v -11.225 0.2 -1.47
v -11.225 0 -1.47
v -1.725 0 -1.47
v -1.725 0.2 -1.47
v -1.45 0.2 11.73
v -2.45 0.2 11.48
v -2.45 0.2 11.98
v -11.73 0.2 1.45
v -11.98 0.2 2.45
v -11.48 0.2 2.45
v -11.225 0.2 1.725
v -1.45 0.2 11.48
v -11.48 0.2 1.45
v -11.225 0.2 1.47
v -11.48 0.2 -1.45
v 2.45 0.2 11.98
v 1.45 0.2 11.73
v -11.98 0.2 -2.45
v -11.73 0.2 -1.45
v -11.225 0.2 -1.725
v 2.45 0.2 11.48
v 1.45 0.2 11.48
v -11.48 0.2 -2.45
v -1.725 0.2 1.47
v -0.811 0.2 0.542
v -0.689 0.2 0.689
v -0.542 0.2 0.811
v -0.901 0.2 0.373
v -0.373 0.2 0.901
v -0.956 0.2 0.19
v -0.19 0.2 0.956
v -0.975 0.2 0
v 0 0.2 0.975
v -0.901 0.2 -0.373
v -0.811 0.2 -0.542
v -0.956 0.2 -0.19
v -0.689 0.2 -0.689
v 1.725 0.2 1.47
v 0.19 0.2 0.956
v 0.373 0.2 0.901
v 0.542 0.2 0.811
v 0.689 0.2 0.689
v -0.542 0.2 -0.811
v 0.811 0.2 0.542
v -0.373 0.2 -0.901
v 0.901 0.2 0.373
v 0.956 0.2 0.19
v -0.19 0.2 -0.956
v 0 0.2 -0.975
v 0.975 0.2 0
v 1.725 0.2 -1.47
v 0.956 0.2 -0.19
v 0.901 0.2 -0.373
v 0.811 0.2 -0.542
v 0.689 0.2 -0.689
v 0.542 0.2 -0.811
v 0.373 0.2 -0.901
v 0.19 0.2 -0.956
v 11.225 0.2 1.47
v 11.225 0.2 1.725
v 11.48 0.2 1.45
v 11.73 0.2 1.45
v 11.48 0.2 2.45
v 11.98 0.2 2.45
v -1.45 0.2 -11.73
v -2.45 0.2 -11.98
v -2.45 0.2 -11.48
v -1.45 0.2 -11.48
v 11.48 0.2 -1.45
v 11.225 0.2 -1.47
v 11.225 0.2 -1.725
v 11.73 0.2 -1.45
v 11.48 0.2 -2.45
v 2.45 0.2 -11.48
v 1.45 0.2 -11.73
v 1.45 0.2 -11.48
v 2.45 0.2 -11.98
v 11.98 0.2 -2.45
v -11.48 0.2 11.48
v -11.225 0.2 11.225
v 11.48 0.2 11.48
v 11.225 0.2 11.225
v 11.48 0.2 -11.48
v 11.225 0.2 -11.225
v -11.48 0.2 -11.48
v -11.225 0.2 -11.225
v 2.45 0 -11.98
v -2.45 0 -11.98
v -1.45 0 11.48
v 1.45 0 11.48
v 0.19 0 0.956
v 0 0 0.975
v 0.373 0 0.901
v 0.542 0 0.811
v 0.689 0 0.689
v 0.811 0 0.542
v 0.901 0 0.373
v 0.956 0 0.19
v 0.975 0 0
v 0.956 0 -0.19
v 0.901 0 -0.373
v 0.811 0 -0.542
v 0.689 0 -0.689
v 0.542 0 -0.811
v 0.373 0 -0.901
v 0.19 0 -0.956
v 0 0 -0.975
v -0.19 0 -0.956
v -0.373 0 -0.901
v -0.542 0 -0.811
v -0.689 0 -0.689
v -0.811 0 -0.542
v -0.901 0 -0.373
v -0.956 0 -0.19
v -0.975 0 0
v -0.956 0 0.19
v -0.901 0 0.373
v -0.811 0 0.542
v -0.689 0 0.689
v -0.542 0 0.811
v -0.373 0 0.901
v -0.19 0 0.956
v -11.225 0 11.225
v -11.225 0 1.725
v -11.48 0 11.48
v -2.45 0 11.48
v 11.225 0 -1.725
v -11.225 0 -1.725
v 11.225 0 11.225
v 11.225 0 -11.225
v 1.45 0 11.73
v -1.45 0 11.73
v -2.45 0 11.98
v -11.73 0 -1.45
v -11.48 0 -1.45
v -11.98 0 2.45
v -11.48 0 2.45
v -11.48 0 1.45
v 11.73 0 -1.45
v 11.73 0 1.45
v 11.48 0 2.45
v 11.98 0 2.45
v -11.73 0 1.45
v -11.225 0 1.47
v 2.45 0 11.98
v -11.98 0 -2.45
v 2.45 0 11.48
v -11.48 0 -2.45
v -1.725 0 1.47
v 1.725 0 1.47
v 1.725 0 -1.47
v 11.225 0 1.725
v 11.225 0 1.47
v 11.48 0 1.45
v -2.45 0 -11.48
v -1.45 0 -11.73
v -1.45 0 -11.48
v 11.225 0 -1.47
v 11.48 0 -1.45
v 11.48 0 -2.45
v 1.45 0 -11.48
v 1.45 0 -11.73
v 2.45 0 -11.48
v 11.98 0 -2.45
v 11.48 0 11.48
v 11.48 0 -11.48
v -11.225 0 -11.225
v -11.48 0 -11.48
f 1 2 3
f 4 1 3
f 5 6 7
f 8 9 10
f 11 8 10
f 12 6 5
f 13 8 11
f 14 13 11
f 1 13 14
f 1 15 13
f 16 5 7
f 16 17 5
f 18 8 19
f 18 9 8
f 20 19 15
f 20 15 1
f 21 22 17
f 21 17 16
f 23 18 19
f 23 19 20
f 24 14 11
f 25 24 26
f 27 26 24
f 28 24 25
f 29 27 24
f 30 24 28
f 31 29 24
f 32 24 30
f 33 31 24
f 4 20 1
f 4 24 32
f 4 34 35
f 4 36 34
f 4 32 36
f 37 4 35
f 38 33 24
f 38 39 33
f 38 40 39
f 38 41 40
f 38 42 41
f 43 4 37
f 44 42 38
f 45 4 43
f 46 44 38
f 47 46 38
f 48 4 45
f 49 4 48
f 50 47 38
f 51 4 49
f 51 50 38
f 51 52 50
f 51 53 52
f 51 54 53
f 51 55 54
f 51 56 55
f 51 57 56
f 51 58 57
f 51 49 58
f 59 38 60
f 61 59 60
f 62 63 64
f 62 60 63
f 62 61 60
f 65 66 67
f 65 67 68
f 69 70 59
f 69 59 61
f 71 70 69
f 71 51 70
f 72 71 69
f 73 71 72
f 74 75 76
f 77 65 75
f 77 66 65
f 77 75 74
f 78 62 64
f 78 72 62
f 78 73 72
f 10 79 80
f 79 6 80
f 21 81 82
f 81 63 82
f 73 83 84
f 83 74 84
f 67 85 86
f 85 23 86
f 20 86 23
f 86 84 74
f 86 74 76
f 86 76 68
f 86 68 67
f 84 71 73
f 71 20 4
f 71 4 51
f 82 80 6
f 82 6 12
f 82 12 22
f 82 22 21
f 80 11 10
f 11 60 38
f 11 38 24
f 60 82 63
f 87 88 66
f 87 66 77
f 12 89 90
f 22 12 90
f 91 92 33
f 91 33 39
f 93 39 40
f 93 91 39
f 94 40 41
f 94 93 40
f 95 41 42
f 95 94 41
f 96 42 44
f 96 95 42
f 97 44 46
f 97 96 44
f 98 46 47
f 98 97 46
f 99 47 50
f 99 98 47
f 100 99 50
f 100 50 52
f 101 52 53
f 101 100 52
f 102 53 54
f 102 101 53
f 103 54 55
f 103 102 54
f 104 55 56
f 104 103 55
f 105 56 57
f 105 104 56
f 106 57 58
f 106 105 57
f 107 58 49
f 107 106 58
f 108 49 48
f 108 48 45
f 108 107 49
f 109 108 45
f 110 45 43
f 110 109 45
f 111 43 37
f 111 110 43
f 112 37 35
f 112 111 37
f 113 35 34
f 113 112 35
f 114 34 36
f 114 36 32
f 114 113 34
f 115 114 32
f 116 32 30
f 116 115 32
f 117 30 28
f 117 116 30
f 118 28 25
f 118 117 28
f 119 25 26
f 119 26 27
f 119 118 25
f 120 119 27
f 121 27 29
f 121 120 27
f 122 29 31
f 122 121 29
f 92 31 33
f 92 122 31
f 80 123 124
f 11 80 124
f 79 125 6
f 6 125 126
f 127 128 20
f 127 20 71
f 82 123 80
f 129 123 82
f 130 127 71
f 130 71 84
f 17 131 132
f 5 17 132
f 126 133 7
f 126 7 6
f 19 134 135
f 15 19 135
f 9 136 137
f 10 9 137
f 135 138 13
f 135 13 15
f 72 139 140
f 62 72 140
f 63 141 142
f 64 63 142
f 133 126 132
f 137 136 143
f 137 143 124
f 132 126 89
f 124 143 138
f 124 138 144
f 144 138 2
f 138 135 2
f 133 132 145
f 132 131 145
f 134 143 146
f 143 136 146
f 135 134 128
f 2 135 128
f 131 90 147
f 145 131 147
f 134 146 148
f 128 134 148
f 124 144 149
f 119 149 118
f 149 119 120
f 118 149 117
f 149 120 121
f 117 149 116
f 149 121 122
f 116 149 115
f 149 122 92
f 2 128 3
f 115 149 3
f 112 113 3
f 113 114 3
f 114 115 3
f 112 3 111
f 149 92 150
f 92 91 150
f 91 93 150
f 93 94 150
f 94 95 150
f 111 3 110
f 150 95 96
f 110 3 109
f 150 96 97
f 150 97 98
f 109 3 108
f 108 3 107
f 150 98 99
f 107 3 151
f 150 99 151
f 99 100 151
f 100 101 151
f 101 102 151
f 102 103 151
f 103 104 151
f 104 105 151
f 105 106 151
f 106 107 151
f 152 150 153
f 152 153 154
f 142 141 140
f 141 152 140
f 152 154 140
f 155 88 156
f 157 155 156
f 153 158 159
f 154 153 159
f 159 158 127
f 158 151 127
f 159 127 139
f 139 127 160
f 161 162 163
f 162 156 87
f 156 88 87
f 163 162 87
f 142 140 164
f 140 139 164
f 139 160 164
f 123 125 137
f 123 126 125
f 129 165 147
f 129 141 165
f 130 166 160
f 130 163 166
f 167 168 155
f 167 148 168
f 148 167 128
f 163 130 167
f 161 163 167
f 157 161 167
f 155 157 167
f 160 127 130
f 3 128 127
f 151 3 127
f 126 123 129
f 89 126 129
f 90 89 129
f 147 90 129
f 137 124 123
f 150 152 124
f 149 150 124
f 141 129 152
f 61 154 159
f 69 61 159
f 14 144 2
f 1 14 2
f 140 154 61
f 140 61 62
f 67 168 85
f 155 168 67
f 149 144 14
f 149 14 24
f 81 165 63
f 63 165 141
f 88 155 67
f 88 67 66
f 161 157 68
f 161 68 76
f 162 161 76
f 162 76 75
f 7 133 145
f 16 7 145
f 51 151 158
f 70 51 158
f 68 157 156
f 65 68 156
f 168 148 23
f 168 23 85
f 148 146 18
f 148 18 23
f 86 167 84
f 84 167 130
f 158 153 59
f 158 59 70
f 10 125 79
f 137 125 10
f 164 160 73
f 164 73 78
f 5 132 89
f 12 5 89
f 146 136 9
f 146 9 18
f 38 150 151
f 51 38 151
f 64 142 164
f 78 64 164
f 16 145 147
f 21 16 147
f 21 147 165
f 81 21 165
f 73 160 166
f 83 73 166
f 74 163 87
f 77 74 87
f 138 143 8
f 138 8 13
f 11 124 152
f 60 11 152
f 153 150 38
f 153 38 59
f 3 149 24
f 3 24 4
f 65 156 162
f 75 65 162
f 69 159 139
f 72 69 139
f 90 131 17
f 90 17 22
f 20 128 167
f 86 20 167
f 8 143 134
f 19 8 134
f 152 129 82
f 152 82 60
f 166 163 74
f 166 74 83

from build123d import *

# Parameters (mm, degrees)
SKETCH1_W           = 0.25
SKETCH1_H           = 1
SKETCH1_W_2         = 22.96
SKETCH1_H_2         = 22.96
SKETCH1_W_3         = 22.45
SKETCH1_H_3         = 22.45
SKETCH1_W_4         = 9.5
SKETCH1_H_4         = 0.255
SKETCH1_W_5         = 3.45
SKETCH1_H_5         = 3.45
SKETCH1_R           = 0.975
SKETCH1_W_6         = 1
SKETCH1_H_6         = 0.25
SKETCH1_W_7         = 4.9
SKETCH1_H_7         = 4.9
BOSS_EXTRUDE5_DEPTH = 0.2


with BuildPart() as part:
    # Sketch1 → Boss-Extrude5 (new body)
    # profile 1 of 18: a face of its own
    with BuildSketch(Plane(origin=(0, 0, 0), x_dir=(1, 0, 0), z_dir=(0, 1, 0))):
        with Locations((-11.605, -1.95)):
            Rectangle(SKETCH1_W, SKETCH1_H)
    # profile 2 of 18: a face of its own
    with BuildSketch(Plane(origin=(0, 0, 0), x_dir=(1, 0, 0), z_dir=(0, 1, 0))):
        with Locations((-11.605, 1.95)):
            Rectangle(SKETCH1_W, SKETCH1_H)
    # profile 3 of 18: a face of its own
    with BuildSketch(Plane(origin=(0, 0, 0), x_dir=(1, 0, 0), z_dir=(0, 1, 0))):
        Rectangle(SKETCH1_W_2, SKETCH1_H_2)
        Rectangle(SKETCH1_W_3, SKETCH1_H_3, mode=Mode.SUBTRACT)
    # profile 4 of 18: a face of its own
    with BuildSketch(Plane(origin=(0, 0, 0), x_dir=(1, 0, 0), z_dir=(0, 1, 0))):
        with Locations((-6.475, 1.5975)):
            Rectangle(SKETCH1_W_4, SKETCH1_H_4)
    # profile 5 of 18: a face of its own
    with BuildSketch(Plane(origin=(0, 0, 0), x_dir=(1, 0, 0), z_dir=(0, 1, 0))):
        with Locations((-6.475, -1.5975)):
            Rectangle(SKETCH1_W_4, SKETCH1_H_4)
    # profile 6 of 18: a face of its own
    with BuildSketch(Plane(origin=(0, 0, 0), x_dir=(1, 0, 0), z_dir=(0, 1, 0))):
        with Locations((6.475, 1.5975)):
            Rectangle(SKETCH1_W_4, SKETCH1_H_4)
    # profile 7 of 18: a face of its own
    with BuildSketch(Plane(origin=(0, 0, 0), x_dir=(1, 0, 0), z_dir=(0, 1, 0))):
        with Locations((6.475, -1.5975)):
            Rectangle(SKETCH1_W_4, SKETCH1_H_4)
    # profile 8 of 18: a face of its own
    with BuildSketch(Plane(origin=(0, 0, 0), x_dir=(1, 0, 0), z_dir=(0, 1, 0))):
        with Locations((11.605, 1.95)):
            Rectangle(SKETCH1_W, SKETCH1_H)
    # profile 9 of 18: a face of its own
    with BuildSketch(Plane(origin=(0, 0, 0), x_dir=(1, 0, 0), z_dir=(0, 1, 0))):
        with Locations((11.605, -1.95)):
            Rectangle(SKETCH1_W, SKETCH1_H)
    # profile 10 of 18: a face of its own
    with BuildSketch(Plane(origin=(0, 0, 0), x_dir=(1, 0, 0), z_dir=(0, 1, 0))):
        Rectangle(SKETCH1_W_5, SKETCH1_H_5)
        with Locations(Location((0, 0, 0), (0, 0, 270))):
            Circle(SKETCH1_R, mode=Mode.SUBTRACT)
    # profile 11 of 18: a face of its own
    with BuildSketch(Plane(origin=(0, 0, 0), x_dir=(1, 0, 0), z_dir=(0, 1, 0))):
        Polygon((-1.45, -11.73), (-2.45, -11.73), (-2.45, -11.98), (2.45, -11.98), (2.45, -11.73), (1.45, -11.73), align=None)
    # profile 12 of 18: a face of its own
    with BuildSketch(Plane(origin=(0, 0, 0), x_dir=(1, 0, 0), z_dir=(0, 1, 0))):
        with Locations((1.95, -11.605)):
            Rectangle(SKETCH1_W_6, SKETCH1_H_6)
    # profile 13 of 18: a face of its own
    with BuildSketch(Plane(origin=(0, 0, 0), x_dir=(1, 0, 0), z_dir=(0, 1, 0))):
        with Locations((-1.95, -11.605)):
            Rectangle(SKETCH1_W_6, SKETCH1_H_6)
    # profile 14 of 18: a face of its own
    with BuildSketch(Plane(origin=(0, 0, 0), x_dir=(1, 0, 0), z_dir=(0, 1, 0))):
        Polygon((11.98, 2.45), (11.73, 2.45), (11.73, 1.45), (11.73, -1.45), (11.73, -2.45), (11.98, -2.45), align=None)
    # profile 15 of 18: a face of its own
    with BuildSketch(Plane(origin=(0, 0, 0), x_dir=(1, 0, 0), z_dir=(0, 1, 0))):
        with Locations((1.95, 11.605)):
            Rectangle(SKETCH1_W_6, SKETCH1_H_6)
    # profile 16 of 18: a face of its own
    with BuildSketch(Plane(origin=(0, 0, 0), x_dir=(1, 0, 0), z_dir=(0, 1, 0))):
        with Locations((0, 11.855)):
            Rectangle(SKETCH1_W_7, SKETCH1_H_6)
    # profile 17 of 18: a face of its own
    with BuildSketch(Plane(origin=(0, 0, 0), x_dir=(1, 0, 0), z_dir=(0, 1, 0))):
        with Locations((-1.95, 11.605)):
            Rectangle(SKETCH1_W_6, SKETCH1_H_6)
    # profile 18 of 18: a face of its own
    with BuildSketch(Plane(origin=(0, 0, 0), x_dir=(1, 0, 0), z_dir=(0, 1, 0))):
        with Locations((-11.855, 0)):
            Rectangle(SKETCH1_W, SKETCH1_H_7)
    extrude(amount=BOSS_EXTRUDE5_DEPTH)


solid = part.part
